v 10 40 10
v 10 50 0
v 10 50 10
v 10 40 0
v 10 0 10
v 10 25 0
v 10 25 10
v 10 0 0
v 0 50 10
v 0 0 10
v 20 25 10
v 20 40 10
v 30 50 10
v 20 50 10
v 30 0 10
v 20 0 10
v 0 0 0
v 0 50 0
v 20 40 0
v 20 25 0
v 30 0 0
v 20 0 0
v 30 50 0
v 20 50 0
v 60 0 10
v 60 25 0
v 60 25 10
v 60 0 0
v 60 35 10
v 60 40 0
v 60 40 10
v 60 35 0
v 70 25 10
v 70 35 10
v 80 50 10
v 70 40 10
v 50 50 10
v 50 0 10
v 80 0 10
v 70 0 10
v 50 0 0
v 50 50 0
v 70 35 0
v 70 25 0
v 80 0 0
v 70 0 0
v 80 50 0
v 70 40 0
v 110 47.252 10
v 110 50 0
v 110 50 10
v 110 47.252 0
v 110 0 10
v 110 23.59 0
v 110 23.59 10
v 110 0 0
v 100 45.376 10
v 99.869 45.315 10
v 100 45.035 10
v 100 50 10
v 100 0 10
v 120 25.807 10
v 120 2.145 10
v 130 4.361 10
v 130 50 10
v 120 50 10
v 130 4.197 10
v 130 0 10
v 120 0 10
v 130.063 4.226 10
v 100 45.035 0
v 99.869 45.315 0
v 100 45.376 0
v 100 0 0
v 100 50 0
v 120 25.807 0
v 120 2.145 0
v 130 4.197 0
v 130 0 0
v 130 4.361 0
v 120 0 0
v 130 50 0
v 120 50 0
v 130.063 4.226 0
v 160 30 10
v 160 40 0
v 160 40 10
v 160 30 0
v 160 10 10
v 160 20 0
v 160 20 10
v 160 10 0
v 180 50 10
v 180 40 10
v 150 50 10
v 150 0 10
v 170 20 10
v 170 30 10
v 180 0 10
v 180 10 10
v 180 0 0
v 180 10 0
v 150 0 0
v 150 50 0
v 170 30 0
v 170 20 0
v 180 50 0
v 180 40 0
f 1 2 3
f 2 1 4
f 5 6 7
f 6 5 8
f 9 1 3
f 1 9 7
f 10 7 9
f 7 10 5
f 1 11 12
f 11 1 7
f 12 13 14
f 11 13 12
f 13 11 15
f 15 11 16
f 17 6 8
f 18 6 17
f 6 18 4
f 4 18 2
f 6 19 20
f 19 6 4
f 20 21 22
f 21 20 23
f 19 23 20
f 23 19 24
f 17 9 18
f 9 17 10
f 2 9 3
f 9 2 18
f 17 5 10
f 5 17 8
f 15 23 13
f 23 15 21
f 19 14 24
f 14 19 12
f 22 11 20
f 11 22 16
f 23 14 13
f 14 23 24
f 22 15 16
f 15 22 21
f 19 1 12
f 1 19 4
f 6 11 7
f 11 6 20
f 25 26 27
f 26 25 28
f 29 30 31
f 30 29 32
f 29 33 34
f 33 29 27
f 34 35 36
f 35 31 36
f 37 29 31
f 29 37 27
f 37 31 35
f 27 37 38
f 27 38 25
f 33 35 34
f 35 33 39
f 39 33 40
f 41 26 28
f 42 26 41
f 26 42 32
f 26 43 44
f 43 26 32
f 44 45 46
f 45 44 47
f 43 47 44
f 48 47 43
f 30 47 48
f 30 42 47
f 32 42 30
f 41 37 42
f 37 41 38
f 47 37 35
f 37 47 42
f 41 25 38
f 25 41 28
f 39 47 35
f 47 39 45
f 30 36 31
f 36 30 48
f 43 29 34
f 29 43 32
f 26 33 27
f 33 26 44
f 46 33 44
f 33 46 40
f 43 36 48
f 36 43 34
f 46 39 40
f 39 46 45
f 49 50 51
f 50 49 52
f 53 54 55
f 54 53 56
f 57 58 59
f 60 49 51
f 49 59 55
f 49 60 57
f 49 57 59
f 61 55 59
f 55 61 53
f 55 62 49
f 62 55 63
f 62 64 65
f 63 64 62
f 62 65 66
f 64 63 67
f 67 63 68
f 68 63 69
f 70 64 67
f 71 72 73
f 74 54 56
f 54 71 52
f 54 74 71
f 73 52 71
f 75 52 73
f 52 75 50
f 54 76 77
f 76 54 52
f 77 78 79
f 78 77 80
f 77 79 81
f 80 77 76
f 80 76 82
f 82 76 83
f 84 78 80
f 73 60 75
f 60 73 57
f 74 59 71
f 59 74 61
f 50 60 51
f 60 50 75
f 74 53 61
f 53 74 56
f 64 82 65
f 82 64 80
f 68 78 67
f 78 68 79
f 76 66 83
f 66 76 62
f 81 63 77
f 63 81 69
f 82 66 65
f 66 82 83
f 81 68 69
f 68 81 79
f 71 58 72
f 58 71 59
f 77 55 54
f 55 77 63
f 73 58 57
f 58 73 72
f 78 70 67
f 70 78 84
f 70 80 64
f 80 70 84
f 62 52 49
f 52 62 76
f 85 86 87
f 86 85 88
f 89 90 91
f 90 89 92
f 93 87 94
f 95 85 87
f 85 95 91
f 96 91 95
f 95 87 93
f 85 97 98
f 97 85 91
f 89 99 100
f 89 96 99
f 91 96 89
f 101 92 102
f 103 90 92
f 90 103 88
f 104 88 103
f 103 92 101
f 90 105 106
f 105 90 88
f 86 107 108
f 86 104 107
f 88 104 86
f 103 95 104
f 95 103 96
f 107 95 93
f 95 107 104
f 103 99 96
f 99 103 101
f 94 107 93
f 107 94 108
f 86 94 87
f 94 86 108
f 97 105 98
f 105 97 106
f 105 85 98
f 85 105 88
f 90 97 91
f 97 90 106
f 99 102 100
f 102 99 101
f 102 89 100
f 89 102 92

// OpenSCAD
union(){
    translate(v=[0, 0, 0]){
        color("pink"){
            union(){
                cube(size=[10, 50, 10]);
                translate(v=[20, 0, 0]){
                    cube(size=[10, 50, 10]);
                };
                translate(v=[10, 25, 0]){
                    cube(size=[10, 15.0, 10]);
                };
            };
        };
    };
    translate(v=[50, 0, 0]){
        color("green"){
            union(){
                cube(size=[10, 50, 10]);
                translate(v=[0, 40, 0]){
                    cube(size=[30, 10, 10]);
                };
                translate(v=[0, 25, 0]){
                    cube(size=[30, 10, 10]);
                };
                translate(v=[20, 0, 0]){
                    cube(size=[10, 50, 10]);
                };
            };
        };
    };
    translate(v=[100, 0, 0]){
        color("pink"){
            union(){
                cube(size=[10, 50, 10]);
                translate(v=[20, 0, 0]){
                    cube(size=[10, 50, 10]);
                };
                translate(v=[21, 0, 0]){
                    rotate(a=[0, 0, 25]){
                        cube(size=[10, 50, 10]);
                    };
                };
            };
        };
    };
    translate(v=[150, 0, 0]){
        color("green"){
            union(){
                cube(size=[10, 50, 10]);
                translate(v=[0, 40, 0]){
                    cube(size=[30, 10, 10]);
                };
                translate(v=[0, 20, 0]){
                    cube(size=[20, 10, 10]);
                };
                translate(v=[0, 0, 0]){
                    cube(size=[30, 10, 10]);
                };
            };
        };
    };
};
